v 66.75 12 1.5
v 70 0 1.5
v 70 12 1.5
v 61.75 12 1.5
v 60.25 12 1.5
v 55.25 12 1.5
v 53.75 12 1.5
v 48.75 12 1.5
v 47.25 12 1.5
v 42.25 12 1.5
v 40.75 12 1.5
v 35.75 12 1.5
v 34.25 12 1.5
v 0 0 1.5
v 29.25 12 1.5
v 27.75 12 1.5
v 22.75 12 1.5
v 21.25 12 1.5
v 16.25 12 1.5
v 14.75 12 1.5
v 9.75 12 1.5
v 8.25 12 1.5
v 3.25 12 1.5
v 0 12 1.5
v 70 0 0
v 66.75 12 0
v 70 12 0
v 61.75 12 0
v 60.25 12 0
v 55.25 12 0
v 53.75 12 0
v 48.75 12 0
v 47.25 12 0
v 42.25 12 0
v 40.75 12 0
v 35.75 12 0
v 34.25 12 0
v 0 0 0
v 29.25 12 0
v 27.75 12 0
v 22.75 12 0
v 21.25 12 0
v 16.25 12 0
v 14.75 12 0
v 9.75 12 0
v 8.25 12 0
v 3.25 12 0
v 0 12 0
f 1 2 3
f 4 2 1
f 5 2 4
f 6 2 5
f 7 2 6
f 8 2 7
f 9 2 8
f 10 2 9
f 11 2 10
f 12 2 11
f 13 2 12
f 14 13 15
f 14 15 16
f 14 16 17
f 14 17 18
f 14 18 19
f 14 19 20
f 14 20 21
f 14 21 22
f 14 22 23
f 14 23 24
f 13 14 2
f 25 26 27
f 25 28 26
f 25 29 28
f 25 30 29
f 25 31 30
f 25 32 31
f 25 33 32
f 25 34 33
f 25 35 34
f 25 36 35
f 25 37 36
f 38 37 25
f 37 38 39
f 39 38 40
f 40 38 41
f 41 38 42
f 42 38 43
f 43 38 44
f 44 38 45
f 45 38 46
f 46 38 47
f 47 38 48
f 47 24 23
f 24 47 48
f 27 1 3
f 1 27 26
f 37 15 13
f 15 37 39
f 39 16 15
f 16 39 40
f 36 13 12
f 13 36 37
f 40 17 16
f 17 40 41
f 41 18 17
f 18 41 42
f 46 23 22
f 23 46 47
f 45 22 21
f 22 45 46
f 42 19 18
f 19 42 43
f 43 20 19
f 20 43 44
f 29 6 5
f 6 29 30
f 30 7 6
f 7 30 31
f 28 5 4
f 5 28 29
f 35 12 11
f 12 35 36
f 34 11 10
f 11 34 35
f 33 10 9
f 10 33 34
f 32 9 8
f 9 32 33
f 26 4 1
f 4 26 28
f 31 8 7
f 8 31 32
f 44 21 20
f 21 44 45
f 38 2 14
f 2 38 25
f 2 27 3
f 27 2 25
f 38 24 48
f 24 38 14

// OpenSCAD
// Agarose gel comb - a flat plate with a back bar and a row of rectangular teeth for casting
// horizontal gels. NOVEL general part, printed lying flat on the bed.
//

teeth = 10;
bar_l = 70;
bar_w = 12;
t     = 1.5;
tooth_w = 5.0;
tooth_l = 12;
gap   = 1.5;

$fn = 48;

teeth_start = (bar_l - (teeth * tooth_w + (teeth - 1) * gap)) / 2;

difference() {
    union() {
        cube([bar_l, bar_w, t]);                                     // back bar
        for (i = [0 : teeth - 1])
            translate([teeth_start + i * (tooth_w + gap), 0, 0]) cube([tooth_w, tooth_l, t]);   // teeth
    }
    for (i = [0 : teeth - 1])
        translate([teeth_start + i * (tooth_w + gap), tooth_l, 0]) cube([tooth_w, tooth_l + 1, t]);   // cut through the tips
}
